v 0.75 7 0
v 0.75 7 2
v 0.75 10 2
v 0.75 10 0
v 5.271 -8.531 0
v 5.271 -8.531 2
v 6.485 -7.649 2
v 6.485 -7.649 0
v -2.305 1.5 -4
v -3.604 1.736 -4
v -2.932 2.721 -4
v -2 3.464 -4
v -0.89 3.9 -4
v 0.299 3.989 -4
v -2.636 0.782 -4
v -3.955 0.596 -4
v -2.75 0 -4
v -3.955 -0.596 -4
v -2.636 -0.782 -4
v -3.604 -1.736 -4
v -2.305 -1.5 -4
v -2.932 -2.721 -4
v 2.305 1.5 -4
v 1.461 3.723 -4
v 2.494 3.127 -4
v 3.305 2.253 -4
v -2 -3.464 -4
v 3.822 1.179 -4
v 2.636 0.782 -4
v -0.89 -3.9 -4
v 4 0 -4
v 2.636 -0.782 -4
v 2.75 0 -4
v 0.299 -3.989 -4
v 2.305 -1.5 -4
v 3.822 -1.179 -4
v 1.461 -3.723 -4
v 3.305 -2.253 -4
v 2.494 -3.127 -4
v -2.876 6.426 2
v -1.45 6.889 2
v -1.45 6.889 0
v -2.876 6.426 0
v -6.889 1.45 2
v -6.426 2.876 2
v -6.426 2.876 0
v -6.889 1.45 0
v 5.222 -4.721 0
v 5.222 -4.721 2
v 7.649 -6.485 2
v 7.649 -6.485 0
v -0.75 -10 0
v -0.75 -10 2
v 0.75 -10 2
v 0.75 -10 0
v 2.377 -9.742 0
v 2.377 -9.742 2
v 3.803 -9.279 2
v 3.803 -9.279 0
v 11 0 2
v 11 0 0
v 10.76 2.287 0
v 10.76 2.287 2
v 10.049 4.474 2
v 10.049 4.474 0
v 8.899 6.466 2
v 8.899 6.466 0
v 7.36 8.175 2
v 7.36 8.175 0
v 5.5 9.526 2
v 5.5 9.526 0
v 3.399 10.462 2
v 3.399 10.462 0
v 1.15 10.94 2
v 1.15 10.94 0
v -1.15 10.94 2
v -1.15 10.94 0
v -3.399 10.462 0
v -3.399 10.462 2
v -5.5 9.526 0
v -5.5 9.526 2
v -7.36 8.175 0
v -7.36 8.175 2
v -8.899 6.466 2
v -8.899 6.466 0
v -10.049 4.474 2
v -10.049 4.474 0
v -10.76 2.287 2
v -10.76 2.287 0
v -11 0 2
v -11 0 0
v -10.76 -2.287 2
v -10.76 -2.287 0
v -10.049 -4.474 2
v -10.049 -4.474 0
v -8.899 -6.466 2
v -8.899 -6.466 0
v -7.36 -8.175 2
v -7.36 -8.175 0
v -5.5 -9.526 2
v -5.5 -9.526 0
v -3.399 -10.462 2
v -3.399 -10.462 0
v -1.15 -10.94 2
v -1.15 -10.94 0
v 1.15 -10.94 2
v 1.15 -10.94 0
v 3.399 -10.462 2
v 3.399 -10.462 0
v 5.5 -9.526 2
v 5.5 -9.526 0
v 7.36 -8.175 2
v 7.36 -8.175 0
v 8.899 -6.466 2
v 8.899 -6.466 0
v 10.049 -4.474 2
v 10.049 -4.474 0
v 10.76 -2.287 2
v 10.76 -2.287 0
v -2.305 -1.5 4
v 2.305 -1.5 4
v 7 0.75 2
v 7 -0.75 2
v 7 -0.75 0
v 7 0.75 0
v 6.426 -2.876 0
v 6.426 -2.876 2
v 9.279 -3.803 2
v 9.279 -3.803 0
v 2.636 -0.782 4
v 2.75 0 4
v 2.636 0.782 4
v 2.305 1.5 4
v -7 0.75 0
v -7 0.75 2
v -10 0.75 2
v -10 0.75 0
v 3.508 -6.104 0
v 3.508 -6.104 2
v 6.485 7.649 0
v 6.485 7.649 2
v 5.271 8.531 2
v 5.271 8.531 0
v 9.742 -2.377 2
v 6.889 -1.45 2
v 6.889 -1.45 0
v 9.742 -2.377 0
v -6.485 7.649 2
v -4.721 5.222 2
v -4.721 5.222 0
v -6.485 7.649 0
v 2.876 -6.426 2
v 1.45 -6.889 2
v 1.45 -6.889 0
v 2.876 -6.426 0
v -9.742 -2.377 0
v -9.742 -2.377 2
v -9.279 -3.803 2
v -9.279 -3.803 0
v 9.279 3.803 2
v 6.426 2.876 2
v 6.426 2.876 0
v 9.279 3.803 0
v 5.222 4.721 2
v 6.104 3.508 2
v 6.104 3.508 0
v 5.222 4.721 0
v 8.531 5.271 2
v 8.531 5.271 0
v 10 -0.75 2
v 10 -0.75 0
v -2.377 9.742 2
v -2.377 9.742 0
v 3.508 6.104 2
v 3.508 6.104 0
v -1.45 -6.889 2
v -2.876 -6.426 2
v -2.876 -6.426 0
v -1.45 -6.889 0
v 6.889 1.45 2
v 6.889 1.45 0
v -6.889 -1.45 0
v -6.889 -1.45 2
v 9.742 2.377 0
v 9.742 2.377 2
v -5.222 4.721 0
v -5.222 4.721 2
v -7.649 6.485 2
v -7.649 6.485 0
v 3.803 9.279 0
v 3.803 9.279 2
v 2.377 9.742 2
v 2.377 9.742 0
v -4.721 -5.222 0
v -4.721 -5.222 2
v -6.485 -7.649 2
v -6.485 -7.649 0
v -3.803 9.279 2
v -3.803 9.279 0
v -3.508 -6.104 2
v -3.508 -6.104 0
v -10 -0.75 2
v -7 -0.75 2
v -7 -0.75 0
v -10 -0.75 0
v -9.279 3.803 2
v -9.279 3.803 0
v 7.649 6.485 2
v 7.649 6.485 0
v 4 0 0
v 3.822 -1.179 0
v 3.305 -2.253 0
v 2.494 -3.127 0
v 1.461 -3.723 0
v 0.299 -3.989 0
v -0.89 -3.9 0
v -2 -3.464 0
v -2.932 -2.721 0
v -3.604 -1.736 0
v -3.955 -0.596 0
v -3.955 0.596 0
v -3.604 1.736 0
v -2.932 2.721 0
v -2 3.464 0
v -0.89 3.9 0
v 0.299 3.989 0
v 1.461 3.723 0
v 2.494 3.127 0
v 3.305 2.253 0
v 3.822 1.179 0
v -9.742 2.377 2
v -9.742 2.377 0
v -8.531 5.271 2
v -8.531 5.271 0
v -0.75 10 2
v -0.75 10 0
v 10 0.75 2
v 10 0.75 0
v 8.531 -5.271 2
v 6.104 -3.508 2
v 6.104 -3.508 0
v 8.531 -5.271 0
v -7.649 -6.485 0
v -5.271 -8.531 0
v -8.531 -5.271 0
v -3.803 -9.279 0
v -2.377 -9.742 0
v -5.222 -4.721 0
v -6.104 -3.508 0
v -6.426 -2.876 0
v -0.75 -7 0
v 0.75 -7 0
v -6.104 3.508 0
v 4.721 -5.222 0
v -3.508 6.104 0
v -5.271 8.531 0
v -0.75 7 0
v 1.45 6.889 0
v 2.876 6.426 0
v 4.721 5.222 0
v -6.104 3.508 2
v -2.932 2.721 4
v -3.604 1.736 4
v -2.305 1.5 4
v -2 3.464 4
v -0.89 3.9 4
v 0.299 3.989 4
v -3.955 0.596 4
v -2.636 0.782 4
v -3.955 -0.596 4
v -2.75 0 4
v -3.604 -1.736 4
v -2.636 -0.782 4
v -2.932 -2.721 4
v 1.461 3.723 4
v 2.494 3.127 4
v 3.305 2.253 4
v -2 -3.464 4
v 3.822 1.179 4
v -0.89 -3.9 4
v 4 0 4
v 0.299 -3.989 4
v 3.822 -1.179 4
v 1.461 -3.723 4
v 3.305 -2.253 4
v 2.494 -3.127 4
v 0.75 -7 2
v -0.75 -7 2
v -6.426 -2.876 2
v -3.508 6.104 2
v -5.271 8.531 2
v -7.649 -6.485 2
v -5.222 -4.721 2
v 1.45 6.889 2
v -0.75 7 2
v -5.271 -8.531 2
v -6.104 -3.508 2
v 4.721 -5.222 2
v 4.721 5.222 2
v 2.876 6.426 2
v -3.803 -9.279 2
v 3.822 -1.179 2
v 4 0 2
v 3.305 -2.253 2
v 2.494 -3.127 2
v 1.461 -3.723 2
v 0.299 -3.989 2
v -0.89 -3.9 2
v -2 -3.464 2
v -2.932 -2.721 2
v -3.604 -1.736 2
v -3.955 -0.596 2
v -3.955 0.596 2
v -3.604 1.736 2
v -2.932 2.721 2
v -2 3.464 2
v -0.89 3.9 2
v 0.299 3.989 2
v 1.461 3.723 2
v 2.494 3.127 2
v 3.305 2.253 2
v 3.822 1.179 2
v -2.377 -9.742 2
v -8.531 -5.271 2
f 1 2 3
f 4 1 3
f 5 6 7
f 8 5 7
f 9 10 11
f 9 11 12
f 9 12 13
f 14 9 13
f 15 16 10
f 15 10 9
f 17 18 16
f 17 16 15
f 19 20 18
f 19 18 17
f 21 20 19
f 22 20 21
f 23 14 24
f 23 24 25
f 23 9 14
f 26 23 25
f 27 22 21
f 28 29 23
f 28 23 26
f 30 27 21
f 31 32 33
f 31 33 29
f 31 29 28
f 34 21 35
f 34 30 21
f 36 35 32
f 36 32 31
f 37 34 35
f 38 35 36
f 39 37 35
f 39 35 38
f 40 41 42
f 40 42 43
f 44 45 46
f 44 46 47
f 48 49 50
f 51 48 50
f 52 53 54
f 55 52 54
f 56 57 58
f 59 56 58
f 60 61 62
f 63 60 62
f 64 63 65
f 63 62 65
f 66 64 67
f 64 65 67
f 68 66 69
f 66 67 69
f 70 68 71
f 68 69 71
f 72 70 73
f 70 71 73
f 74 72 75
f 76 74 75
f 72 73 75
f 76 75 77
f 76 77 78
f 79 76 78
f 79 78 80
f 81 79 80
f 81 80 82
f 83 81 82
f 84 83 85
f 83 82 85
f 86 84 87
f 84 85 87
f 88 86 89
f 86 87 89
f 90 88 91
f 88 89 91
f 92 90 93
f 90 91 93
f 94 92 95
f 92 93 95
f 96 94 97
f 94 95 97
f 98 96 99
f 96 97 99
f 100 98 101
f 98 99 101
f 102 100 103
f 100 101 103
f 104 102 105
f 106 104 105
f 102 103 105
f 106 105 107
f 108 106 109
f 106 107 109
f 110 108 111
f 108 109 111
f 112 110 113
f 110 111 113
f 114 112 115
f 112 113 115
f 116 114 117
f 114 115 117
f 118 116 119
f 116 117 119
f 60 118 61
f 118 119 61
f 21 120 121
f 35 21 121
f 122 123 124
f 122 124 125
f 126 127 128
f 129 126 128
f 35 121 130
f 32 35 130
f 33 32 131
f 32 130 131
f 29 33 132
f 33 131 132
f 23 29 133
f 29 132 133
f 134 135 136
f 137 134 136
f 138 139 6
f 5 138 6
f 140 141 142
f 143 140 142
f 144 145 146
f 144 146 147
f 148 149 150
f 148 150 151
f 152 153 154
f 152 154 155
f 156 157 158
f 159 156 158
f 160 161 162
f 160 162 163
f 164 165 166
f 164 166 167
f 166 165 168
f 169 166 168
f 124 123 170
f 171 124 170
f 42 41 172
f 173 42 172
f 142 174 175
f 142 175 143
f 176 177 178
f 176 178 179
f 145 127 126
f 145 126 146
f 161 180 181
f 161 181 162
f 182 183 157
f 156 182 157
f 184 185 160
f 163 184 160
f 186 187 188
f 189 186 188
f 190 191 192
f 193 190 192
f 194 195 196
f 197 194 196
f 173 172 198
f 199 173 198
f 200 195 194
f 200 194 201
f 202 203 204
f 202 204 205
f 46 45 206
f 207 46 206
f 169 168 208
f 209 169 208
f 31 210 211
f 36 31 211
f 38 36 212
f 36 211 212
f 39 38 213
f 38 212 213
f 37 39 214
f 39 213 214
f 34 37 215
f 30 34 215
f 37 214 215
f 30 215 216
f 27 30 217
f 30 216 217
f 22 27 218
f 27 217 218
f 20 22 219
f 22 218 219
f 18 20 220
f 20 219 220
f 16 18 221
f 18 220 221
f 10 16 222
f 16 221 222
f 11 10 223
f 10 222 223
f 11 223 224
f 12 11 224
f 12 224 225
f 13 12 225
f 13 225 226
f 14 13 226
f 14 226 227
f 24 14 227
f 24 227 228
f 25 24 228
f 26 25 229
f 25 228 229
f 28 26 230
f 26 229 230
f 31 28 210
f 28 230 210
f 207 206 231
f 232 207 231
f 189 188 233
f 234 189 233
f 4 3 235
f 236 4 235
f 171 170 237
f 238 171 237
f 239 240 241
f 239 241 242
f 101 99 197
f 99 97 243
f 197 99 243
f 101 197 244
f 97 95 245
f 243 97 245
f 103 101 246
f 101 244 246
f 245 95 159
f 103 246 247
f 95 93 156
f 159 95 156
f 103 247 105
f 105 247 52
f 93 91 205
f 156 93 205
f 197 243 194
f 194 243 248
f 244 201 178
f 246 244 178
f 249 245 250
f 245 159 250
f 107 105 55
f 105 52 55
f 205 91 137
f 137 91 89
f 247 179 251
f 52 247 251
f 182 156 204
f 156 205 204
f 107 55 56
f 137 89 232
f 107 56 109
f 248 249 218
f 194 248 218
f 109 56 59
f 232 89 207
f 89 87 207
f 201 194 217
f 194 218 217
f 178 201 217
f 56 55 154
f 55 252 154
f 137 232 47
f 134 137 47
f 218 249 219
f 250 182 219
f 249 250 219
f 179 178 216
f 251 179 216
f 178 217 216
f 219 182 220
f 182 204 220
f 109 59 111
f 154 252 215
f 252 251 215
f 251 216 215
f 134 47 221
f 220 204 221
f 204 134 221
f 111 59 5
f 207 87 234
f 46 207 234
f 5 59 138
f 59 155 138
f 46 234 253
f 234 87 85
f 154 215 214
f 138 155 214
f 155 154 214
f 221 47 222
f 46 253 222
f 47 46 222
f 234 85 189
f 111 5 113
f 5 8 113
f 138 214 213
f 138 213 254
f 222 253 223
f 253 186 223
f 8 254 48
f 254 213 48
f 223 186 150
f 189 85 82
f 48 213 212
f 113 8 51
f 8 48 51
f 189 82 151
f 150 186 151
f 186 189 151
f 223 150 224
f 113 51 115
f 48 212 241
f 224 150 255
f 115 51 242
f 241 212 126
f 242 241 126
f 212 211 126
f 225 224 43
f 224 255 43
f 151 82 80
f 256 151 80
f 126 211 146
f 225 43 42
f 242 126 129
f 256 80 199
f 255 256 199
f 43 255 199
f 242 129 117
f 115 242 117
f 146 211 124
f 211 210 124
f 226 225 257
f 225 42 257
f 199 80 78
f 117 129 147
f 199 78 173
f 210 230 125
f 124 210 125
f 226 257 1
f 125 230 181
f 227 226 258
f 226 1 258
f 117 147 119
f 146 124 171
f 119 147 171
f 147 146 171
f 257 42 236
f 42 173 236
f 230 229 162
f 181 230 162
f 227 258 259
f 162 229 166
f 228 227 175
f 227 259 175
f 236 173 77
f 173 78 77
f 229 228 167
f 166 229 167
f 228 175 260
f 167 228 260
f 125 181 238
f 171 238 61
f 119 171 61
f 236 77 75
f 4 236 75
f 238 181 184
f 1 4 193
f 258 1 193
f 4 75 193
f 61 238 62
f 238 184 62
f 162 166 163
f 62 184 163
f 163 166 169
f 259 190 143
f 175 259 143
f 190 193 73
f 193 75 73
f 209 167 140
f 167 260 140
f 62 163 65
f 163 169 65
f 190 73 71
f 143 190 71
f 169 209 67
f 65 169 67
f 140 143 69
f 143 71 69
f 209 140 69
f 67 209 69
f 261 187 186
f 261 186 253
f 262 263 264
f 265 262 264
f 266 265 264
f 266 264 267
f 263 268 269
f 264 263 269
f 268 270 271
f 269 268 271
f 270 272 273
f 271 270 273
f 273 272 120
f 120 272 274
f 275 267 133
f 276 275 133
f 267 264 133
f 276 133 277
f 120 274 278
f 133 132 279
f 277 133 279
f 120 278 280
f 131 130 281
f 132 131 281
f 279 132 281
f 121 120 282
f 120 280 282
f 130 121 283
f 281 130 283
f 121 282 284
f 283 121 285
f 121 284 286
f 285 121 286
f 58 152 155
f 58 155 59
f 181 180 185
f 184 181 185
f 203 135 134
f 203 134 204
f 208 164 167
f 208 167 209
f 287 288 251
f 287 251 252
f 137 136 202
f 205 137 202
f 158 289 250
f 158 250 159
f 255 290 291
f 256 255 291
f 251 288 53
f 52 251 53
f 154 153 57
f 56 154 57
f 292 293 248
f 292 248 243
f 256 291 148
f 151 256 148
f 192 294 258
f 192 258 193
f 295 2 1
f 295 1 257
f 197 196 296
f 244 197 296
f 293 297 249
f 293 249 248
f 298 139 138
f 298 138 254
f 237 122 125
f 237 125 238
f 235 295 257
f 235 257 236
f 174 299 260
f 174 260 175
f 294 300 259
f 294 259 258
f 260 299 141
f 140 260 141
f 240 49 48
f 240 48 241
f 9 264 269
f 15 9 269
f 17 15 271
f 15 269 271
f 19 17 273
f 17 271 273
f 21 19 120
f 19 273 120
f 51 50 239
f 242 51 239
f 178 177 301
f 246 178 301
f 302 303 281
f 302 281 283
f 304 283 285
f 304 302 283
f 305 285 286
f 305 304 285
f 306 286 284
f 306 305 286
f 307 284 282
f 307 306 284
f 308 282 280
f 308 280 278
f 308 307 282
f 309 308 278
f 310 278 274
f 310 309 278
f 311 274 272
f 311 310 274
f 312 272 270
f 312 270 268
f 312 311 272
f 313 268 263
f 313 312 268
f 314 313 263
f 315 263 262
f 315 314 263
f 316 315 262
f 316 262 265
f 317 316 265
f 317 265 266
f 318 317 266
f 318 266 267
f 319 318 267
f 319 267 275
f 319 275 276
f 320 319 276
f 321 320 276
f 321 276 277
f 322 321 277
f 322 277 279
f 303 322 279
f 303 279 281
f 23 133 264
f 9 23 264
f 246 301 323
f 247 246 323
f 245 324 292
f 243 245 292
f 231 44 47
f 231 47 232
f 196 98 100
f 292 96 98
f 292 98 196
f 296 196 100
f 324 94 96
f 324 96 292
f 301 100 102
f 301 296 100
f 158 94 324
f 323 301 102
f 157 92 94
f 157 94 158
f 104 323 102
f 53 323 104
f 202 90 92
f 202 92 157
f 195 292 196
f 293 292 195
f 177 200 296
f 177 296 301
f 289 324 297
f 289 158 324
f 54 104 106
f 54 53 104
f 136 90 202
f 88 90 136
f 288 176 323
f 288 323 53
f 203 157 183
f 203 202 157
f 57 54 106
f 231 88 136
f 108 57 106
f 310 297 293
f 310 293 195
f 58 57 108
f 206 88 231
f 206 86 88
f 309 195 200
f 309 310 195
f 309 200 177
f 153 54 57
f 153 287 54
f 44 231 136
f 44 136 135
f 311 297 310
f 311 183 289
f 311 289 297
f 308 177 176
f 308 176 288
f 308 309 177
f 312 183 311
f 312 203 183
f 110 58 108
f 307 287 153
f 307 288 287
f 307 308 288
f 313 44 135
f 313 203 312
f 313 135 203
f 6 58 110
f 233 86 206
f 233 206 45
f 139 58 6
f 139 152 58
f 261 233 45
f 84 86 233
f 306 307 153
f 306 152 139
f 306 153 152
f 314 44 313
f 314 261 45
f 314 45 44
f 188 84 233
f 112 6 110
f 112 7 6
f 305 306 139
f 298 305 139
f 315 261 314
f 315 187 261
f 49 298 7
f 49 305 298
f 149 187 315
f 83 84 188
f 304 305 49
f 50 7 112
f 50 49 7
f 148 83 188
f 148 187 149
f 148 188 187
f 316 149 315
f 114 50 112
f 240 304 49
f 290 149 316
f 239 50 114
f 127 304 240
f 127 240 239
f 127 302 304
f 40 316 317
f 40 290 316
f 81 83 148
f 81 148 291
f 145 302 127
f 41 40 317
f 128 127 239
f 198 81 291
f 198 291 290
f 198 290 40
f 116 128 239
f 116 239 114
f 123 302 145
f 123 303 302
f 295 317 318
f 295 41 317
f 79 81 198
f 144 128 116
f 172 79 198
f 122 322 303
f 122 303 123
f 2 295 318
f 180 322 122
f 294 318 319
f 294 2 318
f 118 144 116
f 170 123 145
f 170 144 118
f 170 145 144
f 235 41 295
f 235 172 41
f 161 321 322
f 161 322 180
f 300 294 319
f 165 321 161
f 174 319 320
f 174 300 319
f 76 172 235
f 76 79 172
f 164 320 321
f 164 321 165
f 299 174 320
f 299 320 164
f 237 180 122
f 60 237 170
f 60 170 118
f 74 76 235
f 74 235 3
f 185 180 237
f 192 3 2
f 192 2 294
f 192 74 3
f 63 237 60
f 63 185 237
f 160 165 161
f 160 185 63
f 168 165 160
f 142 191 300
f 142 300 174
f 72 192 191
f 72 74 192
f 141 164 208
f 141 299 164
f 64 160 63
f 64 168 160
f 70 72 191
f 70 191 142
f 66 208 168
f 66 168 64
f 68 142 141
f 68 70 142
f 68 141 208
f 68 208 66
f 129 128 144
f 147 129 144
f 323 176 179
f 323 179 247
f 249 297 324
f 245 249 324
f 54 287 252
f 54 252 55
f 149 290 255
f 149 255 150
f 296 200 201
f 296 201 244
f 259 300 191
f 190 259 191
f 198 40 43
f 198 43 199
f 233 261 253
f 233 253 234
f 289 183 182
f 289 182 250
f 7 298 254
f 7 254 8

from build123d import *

# Parameters (mm, degrees)
F0_R            = 11
F1_DEPTH        = 2
F2_W            = 3
F2_H            = 1.5
F3_DEPTH        = 2
F3_COPIES_COUNT = 20
F4_R            = 4
F5_DEPTH        = 4
F5_DEPTH_BACK   = 4
F7_DEPTH        = 9


# Not quite as in the source:
# - a pattern or mirror of a feature is missing from the dataset's text; its kind, count and spacing are read off the source's solid


with BuildPart() as f1:
    # F0 (on Top) → F1 (new body)
    with BuildSketch(Plane.XY):
        Circle(F0_R)
    extrude(amount=F1_DEPTH)

    # F2 (on face) → F3 (cut)
    with BuildSketch(Plane.XY.offset(2)):
        with Locations((8.5, 0)):
            Rectangle(F2_W, F2_H)
    f3 = extrude(amount=-F3_DEPTH, mode=Mode.SUBTRACT)

    # F3_copies: F3 ×20 about axis
    f3_copies_axis = Axis((0, 0, 0), (0, 0, 1))
    for i in range(1, F3_COPIES_COUNT):
        add(f3.rotate(f3_copies_axis, i * 360 / F3_COPIES_COUNT), mode=Mode.SUBTRACT)

    # F4 (on face) → F5 (join, two sides)
    with BuildSketch(Plane(origin=(0, 0, 0), x_dir=(1, 0, 0), z_dir=(0, 0, -1))) as f5_sk:
        Circle(F4_R)
    extrude(amount=F5_DEPTH)
    extrude(f5_sk.sketch, amount=-F5_DEPTH_BACK)

    # F6 (on face) → F7 (cut)
    with BuildSketch(Plane.XY.offset(4)):
        with BuildLine():
            Line((-2.3048861143, -1.5), (2.3048861143, -1.5))
            ThreePointArc((2.3048861143, -1.5), (2.75, 0), (2.3048861143, 1.5))
            Line((2.3048861143, 1.5), (-2.3048861143, 1.5))
            ThreePointArc((-2.3048861143, 1.5), (-2.75, 0), (-2.3048861143, -1.5))
        make_face()
    extrude(amount=-F7_DEPTH, mode=Mode.SUBTRACT)


solid = f1.part
